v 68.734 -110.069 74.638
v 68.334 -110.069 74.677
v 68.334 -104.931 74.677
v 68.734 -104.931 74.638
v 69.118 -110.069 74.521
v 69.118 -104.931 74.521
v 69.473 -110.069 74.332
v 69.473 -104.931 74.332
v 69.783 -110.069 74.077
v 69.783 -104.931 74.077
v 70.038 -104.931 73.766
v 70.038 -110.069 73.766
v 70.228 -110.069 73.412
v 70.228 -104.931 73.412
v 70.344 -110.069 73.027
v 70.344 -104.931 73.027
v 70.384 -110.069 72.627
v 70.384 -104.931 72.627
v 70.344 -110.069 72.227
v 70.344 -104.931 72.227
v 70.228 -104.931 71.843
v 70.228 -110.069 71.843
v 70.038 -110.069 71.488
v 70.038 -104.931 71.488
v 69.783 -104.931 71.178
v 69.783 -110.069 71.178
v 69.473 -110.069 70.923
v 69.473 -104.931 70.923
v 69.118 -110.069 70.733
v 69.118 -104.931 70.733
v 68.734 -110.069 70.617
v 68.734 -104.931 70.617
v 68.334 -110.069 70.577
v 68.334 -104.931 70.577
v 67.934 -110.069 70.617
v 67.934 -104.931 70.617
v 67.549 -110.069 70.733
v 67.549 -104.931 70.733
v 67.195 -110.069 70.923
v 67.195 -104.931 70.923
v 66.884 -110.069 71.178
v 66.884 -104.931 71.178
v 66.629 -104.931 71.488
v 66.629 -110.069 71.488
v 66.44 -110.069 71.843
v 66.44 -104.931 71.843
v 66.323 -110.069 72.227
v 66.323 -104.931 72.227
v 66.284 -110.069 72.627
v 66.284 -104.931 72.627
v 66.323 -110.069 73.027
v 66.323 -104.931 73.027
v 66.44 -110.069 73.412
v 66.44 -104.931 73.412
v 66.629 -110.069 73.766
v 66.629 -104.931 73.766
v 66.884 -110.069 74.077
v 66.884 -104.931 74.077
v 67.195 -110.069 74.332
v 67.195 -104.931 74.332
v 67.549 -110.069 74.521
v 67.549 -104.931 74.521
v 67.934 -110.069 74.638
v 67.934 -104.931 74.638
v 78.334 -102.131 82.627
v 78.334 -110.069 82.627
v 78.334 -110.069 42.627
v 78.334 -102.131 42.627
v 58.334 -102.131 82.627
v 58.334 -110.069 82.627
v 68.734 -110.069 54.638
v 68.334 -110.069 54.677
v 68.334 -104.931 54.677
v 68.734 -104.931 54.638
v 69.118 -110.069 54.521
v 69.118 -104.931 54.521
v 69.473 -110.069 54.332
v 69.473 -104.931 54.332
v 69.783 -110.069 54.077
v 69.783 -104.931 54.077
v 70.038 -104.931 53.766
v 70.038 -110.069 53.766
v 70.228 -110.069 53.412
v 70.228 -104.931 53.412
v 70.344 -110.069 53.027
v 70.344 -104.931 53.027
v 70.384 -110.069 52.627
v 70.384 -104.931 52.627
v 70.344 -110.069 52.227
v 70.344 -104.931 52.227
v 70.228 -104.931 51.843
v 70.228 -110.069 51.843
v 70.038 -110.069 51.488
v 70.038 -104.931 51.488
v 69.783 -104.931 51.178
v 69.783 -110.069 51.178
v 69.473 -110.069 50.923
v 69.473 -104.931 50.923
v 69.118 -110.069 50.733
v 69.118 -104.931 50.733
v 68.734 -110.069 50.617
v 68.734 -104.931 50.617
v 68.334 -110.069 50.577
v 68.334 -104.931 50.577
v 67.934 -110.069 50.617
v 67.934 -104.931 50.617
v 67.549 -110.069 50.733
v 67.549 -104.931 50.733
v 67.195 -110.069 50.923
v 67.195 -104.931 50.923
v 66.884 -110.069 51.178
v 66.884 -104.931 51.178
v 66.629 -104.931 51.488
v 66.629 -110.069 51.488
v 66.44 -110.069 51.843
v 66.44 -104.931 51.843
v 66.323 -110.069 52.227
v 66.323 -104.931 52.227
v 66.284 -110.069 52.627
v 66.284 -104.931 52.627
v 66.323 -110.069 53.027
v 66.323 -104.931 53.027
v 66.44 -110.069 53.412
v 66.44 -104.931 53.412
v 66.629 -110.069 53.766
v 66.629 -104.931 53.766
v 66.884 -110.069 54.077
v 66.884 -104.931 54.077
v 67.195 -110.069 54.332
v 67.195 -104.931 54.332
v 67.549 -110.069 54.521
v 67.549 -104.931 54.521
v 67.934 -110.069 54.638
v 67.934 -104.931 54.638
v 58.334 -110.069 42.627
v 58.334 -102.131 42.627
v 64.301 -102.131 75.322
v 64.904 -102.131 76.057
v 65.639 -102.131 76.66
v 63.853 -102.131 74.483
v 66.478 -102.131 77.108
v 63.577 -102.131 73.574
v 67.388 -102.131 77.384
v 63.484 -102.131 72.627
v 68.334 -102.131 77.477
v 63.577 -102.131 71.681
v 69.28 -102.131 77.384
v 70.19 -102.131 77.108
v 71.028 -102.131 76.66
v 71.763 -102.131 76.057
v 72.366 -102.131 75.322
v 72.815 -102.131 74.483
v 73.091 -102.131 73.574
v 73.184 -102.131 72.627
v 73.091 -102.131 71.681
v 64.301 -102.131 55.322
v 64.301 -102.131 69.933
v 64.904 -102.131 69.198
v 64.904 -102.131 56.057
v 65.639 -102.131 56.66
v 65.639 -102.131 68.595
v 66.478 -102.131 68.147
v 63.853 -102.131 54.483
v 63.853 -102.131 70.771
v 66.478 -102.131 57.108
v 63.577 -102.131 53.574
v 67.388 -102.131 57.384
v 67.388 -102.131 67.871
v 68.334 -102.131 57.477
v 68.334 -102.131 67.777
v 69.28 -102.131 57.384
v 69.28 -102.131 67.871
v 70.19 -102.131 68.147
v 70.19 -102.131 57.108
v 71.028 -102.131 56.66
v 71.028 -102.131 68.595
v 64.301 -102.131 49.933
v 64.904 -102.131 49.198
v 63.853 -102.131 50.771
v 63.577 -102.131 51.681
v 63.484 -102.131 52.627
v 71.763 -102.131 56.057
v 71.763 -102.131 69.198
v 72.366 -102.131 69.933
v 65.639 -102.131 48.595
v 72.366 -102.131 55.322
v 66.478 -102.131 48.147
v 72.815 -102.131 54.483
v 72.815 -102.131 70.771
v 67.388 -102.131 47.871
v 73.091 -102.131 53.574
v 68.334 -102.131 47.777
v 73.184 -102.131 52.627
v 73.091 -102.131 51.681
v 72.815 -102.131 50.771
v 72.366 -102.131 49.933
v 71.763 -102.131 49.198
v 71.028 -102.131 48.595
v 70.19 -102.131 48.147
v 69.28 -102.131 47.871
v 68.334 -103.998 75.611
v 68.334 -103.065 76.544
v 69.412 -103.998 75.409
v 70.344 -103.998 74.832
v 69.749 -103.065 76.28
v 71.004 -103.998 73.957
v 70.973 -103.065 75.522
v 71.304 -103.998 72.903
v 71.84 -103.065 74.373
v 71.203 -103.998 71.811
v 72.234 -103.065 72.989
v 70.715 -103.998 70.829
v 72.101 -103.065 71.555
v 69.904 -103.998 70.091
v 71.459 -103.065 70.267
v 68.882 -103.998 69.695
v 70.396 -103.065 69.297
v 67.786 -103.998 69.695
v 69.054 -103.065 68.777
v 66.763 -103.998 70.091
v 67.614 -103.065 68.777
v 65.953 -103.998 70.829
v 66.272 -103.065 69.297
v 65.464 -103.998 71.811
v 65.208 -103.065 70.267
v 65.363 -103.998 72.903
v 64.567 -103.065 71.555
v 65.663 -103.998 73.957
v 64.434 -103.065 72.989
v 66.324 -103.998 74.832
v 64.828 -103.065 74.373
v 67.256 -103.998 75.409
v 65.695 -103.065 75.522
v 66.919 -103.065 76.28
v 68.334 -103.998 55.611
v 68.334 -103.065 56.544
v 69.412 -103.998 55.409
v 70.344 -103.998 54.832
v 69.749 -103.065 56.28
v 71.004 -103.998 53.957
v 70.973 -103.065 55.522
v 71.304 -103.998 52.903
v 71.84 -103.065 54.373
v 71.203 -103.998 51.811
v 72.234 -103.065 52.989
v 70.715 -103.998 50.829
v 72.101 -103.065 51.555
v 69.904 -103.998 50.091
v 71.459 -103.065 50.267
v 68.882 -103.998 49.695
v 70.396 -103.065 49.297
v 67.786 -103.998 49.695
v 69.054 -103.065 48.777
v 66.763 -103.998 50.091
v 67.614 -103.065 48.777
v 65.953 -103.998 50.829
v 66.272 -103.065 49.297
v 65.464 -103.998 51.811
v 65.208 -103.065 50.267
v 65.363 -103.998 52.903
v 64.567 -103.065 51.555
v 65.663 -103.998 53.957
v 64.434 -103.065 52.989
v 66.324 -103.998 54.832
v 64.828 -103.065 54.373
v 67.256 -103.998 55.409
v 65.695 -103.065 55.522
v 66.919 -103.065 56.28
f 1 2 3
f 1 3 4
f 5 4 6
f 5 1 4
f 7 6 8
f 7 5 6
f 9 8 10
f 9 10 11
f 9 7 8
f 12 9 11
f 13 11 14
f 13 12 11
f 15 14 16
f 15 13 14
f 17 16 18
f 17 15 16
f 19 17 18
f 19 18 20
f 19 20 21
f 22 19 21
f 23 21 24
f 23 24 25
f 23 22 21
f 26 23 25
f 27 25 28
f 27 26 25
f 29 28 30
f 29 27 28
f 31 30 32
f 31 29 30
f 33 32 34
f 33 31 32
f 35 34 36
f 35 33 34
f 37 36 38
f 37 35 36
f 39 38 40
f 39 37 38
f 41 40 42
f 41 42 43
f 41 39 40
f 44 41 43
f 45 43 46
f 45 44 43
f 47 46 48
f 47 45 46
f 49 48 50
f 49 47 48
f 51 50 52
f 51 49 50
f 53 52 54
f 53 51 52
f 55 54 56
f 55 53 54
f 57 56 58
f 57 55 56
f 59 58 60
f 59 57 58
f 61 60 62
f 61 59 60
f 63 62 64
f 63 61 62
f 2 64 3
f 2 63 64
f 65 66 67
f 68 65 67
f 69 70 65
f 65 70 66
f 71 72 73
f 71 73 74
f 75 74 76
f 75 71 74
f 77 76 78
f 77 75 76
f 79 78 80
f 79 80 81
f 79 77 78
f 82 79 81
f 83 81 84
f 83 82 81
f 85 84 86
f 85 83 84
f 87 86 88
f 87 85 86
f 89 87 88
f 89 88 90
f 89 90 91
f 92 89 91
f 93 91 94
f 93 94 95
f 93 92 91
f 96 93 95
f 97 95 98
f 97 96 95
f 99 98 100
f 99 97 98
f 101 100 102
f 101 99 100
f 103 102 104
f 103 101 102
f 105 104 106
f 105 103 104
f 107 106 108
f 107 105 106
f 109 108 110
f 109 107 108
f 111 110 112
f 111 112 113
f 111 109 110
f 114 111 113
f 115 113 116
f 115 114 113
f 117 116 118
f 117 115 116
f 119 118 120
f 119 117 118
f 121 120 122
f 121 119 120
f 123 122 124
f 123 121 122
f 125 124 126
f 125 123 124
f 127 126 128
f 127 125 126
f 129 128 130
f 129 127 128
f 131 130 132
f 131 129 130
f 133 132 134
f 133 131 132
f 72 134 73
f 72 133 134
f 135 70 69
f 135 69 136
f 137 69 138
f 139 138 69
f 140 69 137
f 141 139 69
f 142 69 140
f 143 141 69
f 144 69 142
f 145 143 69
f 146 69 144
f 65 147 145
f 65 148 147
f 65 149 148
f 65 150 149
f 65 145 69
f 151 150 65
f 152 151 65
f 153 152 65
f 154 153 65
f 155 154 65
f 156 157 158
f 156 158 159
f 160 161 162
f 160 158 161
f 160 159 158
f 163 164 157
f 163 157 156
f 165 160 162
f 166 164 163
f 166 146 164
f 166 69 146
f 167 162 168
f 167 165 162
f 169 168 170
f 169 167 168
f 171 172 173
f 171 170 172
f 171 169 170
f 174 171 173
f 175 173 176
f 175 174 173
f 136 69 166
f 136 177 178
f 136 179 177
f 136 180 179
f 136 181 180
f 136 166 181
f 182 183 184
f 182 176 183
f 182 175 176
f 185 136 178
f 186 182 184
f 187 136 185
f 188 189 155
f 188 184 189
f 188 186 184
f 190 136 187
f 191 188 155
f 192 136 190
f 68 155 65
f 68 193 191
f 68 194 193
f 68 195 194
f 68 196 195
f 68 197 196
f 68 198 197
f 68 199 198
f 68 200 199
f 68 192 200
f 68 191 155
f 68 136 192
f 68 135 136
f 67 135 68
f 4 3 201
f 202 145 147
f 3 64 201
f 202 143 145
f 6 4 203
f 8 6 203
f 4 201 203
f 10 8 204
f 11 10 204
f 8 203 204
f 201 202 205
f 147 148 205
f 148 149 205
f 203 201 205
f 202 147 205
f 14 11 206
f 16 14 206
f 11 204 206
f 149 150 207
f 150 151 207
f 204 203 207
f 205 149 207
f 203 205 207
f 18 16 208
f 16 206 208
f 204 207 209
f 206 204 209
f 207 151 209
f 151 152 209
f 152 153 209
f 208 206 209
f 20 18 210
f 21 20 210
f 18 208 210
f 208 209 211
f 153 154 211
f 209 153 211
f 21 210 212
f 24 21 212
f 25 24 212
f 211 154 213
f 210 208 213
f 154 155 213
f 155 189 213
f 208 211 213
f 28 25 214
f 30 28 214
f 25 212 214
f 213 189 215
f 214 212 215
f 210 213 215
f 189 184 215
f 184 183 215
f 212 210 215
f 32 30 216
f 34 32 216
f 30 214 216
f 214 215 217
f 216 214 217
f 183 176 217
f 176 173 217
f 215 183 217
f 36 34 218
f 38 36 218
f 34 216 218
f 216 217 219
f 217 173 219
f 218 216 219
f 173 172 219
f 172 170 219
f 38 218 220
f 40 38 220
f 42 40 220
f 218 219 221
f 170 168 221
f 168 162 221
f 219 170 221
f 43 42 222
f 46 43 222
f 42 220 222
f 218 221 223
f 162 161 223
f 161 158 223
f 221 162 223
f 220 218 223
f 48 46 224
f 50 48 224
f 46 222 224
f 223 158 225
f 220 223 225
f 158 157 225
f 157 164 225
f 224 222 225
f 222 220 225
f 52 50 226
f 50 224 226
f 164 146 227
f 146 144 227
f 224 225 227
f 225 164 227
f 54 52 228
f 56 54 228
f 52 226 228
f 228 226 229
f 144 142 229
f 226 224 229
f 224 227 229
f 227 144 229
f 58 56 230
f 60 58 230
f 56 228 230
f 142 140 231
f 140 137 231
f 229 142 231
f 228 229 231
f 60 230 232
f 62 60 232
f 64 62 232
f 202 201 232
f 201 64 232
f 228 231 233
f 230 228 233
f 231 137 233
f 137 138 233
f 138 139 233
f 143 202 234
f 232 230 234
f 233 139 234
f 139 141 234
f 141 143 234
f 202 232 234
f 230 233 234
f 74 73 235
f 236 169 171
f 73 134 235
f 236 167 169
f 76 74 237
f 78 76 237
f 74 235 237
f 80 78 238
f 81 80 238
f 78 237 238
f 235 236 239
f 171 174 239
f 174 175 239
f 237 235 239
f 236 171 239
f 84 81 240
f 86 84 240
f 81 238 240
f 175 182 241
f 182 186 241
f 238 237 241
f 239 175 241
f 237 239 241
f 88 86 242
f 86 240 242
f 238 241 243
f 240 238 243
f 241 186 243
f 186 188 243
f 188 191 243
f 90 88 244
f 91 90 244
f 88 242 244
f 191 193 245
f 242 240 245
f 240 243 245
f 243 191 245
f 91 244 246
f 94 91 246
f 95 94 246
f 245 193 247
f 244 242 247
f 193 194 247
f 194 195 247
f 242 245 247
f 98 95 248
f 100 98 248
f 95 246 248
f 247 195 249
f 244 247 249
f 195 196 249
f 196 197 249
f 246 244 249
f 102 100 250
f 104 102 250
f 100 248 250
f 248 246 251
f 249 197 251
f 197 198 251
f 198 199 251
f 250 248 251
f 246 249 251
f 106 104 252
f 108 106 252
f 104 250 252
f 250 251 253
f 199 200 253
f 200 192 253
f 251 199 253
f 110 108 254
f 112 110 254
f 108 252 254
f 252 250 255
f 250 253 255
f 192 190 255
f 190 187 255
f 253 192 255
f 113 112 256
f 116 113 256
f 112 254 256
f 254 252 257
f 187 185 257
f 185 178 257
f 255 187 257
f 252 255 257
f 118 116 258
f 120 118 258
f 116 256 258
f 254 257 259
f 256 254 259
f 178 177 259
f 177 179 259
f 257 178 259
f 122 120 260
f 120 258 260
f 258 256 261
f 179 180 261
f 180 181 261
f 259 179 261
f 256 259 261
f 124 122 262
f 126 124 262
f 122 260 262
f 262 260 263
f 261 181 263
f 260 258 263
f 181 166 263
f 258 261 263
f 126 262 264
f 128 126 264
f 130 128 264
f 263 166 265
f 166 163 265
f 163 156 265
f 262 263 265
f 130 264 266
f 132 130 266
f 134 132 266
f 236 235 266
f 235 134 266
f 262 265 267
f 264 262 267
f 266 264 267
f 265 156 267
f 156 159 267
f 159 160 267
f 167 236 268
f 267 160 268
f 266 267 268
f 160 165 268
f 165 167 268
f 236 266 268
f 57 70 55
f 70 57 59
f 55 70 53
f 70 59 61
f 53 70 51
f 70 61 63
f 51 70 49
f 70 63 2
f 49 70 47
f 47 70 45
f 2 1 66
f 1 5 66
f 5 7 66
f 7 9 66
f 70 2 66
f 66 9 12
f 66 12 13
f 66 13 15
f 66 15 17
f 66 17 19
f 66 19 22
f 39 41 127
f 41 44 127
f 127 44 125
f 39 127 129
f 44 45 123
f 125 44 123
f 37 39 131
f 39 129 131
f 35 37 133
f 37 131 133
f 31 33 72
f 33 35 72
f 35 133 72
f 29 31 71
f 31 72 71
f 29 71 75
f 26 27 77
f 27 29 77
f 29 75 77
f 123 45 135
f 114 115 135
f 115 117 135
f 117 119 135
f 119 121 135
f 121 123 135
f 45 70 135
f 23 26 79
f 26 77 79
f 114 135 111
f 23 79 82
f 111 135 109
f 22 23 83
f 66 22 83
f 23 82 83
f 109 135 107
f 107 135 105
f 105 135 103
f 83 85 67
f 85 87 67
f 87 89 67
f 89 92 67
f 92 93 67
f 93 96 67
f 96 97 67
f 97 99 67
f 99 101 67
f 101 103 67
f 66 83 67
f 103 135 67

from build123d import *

# Parameters (mm, degrees)
SKETCH1_W           = 20
SKETCH1_H           = 40
SKETCH1_R           = 2.05
BOSS_EXTRUDE1_DEPTH = 7.9375
CHAMFER1_SIZE       = 2.8


with BuildPart() as part:
    # Sketch1 → Boss-Extrude1 (new body)
    with BuildSketch(Plane(origin=(0, -110.068674648, 0), x_dir=(1, 0, 0), z_dir=(0, 1, 0))):
        with Locations((68.333864278, -62.627324848)):
            Rectangle(SKETCH1_W, SKETCH1_H)
        with Locations(Location((68.333864278, -72.627324848, 0), (0, 0, 270))):
            Circle(SKETCH1_R, mode=Mode.SUBTRACT)
        with Locations(Location((68.333864278, -52.627324848, 0), (0, 0, 270))):
            Circle(SKETCH1_R, mode=Mode.SUBTRACT)
    extrude(amount=BOSS_EXTRUDE1_DEPTH)

    # Chamfer1
    chamfer1_edges = [part.edges().sort_by_distance(p)[0] for p in [
        (68.333864278, -102.131174648, 70.577324848),
        (68.333864278, -102.131174648, 50.577324848),
    ]]
    chamfer(chamfer1_edges, length=CHAMFER1_SIZE)


solid = part.part
